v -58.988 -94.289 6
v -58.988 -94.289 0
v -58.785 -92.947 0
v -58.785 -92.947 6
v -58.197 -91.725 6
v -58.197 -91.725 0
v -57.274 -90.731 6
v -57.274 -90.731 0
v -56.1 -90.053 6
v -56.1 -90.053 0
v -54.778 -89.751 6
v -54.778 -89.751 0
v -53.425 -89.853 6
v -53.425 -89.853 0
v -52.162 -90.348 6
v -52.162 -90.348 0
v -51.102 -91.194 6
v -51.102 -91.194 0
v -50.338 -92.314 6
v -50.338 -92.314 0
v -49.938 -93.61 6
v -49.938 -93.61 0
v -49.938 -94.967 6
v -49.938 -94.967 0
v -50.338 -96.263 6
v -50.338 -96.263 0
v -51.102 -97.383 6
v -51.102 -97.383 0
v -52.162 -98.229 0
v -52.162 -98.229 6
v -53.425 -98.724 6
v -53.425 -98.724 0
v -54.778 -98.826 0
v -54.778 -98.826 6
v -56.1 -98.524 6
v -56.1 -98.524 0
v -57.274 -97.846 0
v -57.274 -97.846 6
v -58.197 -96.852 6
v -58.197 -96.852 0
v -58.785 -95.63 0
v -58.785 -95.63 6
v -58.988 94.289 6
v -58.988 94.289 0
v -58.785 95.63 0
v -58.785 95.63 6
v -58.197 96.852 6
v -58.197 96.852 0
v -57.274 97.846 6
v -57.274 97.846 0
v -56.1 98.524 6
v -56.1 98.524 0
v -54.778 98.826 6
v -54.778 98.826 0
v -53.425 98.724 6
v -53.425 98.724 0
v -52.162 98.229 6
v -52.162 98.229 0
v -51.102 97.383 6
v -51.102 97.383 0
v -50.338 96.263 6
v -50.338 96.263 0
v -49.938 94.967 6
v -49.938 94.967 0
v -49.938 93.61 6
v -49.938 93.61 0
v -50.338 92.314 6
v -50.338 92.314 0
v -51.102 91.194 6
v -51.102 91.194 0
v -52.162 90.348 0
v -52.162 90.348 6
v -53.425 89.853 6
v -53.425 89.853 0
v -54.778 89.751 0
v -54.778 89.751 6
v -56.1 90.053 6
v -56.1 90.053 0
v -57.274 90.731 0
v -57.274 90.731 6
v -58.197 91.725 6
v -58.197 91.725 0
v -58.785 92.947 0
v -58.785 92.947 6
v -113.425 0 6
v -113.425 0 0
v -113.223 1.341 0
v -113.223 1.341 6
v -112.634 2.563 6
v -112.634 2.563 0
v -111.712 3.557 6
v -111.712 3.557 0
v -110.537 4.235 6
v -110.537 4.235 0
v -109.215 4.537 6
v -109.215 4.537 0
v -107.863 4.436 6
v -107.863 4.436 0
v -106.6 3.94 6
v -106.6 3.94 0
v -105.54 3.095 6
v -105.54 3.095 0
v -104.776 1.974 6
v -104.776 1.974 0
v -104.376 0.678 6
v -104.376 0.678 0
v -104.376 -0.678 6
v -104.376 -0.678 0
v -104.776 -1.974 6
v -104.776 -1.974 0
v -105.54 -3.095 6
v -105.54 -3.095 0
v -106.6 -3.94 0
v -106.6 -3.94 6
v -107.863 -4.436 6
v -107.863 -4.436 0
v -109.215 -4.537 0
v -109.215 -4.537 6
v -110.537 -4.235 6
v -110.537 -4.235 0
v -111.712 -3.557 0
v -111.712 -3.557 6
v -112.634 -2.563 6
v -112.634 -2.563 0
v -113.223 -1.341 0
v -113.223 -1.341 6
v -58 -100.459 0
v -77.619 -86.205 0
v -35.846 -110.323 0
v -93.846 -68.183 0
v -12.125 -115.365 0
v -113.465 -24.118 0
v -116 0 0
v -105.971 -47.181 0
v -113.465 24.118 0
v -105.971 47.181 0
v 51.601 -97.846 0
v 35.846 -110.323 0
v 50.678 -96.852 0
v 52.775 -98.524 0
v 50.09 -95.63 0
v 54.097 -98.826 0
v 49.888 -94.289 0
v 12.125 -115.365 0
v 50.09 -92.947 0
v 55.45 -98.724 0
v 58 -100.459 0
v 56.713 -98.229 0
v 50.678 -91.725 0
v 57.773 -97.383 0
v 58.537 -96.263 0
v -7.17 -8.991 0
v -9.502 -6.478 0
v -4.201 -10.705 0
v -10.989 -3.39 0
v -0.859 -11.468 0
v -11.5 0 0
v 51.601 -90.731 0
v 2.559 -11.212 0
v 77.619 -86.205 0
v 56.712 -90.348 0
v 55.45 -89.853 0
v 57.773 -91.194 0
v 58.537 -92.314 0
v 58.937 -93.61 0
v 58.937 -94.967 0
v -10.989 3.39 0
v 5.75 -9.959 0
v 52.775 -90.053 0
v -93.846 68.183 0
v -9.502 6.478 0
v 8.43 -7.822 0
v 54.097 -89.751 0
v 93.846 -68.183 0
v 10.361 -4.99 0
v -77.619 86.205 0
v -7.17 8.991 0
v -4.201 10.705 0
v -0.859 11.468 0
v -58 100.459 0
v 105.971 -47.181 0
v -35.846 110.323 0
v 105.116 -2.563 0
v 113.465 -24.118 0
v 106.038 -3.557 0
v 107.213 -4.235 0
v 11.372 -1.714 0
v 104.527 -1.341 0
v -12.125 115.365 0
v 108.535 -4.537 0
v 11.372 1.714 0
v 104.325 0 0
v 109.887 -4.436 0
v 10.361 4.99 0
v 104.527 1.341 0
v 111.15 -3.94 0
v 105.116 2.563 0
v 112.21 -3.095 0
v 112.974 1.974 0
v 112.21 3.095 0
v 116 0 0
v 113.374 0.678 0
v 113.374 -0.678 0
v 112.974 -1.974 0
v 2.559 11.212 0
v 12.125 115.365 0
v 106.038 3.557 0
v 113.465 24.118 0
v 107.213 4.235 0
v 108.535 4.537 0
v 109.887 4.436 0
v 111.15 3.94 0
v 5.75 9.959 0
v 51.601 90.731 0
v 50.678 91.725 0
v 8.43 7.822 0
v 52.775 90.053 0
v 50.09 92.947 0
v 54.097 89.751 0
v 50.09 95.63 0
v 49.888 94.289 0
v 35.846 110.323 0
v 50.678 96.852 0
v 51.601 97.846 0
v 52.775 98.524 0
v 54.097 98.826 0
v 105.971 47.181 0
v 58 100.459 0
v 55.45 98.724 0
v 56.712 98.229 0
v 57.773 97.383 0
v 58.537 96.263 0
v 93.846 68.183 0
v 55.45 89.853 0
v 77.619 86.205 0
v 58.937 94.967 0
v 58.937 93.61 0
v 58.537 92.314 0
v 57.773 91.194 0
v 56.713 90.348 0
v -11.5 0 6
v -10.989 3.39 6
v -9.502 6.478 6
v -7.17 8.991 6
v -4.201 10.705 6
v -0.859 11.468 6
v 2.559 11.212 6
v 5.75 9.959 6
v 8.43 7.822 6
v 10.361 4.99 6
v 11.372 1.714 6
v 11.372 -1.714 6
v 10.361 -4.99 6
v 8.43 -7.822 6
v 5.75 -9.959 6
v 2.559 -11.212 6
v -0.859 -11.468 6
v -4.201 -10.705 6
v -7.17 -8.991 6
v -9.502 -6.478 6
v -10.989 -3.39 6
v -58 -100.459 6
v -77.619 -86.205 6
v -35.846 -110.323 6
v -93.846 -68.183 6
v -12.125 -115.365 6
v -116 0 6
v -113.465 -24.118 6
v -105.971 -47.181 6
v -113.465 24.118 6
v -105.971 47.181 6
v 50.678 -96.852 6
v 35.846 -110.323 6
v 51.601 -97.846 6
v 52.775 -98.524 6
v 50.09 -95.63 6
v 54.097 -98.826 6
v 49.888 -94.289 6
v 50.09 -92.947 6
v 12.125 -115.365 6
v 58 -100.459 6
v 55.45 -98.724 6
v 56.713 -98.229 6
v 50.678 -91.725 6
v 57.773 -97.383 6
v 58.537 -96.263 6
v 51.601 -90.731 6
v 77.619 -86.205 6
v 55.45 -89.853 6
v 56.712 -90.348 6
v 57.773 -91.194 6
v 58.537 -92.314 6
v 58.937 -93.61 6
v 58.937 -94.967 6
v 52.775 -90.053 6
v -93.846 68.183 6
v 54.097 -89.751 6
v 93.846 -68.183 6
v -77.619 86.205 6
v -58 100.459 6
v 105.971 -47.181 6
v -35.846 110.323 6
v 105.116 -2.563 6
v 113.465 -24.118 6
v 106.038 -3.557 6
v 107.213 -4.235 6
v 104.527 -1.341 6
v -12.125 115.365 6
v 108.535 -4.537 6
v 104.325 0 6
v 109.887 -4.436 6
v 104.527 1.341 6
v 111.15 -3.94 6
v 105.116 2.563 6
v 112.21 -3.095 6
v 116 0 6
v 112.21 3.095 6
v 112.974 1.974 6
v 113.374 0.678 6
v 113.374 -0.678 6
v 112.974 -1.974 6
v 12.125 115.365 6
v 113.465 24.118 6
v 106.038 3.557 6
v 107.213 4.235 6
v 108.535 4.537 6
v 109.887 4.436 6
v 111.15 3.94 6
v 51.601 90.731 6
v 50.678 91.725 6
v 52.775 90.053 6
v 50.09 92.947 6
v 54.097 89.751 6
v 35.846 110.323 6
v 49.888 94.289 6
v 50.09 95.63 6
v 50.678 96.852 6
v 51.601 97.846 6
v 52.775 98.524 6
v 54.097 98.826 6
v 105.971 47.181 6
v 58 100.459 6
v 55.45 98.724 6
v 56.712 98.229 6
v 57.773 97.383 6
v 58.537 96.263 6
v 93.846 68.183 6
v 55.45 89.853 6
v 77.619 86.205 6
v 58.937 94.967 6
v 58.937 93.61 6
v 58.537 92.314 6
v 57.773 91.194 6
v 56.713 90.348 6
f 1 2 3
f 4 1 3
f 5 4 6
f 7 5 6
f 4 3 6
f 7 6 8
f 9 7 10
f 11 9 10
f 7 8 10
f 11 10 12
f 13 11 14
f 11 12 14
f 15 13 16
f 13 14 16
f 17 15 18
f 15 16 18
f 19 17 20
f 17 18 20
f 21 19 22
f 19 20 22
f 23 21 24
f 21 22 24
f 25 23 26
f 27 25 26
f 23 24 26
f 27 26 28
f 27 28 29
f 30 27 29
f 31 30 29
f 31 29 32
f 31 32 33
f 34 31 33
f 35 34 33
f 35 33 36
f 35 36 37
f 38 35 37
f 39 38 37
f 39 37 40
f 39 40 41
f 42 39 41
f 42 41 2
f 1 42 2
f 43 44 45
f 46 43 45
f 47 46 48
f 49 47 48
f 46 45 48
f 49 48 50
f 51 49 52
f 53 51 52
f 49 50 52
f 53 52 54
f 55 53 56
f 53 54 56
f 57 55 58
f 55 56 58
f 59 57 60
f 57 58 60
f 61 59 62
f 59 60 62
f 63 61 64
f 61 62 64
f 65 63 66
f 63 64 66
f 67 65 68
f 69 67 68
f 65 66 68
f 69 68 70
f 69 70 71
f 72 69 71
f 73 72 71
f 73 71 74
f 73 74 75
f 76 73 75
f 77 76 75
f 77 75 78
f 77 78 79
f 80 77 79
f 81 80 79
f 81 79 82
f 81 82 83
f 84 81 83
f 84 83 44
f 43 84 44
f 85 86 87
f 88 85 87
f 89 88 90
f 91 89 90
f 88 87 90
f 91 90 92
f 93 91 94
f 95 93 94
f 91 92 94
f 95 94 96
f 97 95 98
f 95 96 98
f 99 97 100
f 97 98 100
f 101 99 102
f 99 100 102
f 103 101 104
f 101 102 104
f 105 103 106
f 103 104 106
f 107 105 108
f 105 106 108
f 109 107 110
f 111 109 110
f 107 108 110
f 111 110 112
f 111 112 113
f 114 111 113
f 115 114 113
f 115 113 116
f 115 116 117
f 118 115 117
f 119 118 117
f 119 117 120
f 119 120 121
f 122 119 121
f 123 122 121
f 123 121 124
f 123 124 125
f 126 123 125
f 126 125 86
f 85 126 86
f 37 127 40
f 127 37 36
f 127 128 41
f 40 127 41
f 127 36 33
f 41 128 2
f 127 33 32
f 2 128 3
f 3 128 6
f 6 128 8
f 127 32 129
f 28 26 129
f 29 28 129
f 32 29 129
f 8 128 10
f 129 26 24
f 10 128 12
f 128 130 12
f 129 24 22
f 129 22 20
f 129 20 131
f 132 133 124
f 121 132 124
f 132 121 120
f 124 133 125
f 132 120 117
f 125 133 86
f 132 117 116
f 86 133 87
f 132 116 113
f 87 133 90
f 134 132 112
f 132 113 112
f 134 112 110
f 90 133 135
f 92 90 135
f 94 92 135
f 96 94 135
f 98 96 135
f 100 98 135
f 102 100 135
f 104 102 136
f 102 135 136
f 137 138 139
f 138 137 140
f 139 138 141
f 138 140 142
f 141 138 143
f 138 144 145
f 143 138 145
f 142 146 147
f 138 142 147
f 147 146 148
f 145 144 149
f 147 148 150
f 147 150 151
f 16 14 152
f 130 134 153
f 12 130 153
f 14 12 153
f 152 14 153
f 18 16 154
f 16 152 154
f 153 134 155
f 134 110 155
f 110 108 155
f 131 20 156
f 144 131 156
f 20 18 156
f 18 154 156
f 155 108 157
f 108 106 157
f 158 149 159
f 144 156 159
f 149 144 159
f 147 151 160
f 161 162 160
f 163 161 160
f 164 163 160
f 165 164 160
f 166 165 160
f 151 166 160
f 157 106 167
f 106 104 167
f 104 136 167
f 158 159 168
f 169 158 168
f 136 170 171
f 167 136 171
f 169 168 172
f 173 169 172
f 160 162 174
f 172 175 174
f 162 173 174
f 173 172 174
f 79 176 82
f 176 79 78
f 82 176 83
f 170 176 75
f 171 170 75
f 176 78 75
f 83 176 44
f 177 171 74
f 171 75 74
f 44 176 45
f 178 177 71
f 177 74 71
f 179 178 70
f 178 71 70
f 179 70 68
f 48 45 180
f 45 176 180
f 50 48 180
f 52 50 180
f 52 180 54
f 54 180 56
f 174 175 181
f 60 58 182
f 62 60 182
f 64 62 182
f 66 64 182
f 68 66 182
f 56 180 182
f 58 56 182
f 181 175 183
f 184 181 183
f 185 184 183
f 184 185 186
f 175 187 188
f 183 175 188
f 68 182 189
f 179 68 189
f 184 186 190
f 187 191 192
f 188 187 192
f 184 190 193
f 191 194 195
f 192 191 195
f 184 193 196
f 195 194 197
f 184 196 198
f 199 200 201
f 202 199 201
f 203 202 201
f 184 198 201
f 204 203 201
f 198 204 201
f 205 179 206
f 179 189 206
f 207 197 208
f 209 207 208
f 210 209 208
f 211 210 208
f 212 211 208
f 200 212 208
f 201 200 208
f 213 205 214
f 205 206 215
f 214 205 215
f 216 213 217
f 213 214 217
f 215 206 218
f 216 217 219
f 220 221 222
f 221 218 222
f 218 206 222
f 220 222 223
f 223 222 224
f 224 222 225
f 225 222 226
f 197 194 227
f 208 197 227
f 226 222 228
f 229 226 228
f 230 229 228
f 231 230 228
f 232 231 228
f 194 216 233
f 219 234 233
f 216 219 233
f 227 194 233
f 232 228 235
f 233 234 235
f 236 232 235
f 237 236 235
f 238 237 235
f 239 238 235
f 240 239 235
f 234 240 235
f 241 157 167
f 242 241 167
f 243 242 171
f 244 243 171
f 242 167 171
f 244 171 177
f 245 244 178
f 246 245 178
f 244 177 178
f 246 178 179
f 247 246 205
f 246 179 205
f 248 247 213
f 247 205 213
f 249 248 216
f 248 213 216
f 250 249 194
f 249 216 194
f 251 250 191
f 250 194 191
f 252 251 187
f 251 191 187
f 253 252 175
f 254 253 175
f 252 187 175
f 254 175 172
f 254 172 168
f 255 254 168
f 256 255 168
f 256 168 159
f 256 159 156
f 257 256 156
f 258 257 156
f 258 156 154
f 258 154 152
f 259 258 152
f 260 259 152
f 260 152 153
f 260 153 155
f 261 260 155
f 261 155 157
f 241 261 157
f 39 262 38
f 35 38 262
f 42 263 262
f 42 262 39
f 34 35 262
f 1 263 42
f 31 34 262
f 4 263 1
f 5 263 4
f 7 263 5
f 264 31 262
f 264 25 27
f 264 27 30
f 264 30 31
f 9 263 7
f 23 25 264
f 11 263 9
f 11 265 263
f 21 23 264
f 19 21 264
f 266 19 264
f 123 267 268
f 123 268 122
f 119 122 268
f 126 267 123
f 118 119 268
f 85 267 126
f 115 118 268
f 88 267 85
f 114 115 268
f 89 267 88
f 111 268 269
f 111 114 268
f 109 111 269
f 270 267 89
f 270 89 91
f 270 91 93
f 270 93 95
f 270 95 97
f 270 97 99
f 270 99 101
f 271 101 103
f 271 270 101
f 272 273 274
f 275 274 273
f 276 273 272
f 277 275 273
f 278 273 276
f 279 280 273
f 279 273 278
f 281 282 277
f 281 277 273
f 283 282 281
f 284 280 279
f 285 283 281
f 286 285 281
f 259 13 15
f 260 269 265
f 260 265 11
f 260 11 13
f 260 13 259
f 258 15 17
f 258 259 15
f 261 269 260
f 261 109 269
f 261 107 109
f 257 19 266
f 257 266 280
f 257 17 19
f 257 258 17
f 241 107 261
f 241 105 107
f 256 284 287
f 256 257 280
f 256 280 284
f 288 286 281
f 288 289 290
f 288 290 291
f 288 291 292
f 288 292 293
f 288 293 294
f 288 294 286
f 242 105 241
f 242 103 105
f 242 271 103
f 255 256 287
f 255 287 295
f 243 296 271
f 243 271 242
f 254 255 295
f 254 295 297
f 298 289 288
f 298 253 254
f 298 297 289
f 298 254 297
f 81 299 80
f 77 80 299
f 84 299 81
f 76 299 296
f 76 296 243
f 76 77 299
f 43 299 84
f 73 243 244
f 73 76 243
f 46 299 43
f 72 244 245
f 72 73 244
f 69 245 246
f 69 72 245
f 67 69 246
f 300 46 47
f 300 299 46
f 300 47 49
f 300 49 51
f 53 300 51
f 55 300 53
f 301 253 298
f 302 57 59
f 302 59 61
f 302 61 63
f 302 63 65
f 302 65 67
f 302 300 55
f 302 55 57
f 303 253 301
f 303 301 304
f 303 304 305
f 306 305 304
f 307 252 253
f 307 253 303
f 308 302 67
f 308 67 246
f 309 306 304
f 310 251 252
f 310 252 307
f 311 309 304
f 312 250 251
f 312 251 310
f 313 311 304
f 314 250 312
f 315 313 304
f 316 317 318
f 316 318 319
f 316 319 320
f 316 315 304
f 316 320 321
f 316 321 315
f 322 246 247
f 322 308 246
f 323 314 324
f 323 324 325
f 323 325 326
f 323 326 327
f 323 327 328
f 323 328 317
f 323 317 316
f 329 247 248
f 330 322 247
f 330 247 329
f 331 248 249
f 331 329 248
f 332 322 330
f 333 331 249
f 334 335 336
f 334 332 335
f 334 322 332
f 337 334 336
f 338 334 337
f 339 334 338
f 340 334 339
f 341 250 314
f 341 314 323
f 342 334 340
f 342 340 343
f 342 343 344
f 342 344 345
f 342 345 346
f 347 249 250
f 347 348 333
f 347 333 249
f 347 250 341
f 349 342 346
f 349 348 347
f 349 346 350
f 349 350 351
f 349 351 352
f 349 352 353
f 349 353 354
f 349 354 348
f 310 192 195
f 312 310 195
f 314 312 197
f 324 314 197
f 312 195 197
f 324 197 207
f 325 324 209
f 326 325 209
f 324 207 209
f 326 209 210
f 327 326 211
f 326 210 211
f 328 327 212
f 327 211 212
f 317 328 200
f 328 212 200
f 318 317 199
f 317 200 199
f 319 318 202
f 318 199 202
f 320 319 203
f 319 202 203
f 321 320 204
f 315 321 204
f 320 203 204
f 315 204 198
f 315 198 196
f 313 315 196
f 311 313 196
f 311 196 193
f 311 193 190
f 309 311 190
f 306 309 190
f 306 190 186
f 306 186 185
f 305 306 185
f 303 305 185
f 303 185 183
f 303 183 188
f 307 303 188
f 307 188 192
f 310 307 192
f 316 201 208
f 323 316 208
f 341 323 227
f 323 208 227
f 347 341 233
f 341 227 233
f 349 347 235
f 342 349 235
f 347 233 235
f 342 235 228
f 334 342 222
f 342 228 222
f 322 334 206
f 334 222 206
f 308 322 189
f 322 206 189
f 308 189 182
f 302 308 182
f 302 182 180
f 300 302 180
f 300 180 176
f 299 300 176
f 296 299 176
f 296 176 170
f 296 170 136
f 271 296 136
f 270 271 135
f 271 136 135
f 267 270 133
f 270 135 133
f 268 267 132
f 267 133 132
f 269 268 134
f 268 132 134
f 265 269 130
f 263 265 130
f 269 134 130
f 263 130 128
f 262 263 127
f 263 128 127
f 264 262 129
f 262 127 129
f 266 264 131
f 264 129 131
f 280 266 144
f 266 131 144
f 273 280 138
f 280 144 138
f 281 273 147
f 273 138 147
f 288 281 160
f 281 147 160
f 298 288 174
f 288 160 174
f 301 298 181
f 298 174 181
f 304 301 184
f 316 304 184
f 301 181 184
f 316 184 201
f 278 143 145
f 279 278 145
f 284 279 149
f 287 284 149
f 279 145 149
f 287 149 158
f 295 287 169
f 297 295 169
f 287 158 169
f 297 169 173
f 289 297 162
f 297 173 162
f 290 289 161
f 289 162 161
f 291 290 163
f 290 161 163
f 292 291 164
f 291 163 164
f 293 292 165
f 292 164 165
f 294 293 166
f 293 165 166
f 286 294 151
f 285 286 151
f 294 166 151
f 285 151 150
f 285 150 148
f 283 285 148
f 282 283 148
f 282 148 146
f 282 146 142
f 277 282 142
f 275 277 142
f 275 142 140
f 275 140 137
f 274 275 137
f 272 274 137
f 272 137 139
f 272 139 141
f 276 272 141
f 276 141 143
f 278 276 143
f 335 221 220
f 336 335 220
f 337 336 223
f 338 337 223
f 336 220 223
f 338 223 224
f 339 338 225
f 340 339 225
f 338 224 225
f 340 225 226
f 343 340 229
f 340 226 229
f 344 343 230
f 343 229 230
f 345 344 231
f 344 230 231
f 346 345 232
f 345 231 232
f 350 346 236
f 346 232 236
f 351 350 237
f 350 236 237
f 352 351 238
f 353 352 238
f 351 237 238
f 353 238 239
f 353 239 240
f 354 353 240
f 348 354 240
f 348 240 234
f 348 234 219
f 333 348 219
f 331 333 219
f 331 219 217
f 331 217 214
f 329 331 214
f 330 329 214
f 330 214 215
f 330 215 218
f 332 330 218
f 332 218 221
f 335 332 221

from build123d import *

# Parameters (mm, degrees)
F0_R     = 116
F1_DEPTH = 6
F3_D     = 9.1
F5_D     = 23


with BuildPart() as f1:
    # F0 (on Top) → F1 (new body)
    with BuildSketch(Plane.XY):
        Circle(F0_R)
    extrude(amount=F1_DEPTH)

    # F3 (through all)
    with Locations(Plane.XY.offset(6)):
        with Locations((-54.4375, 94.288516), (54.4375, 94.288516), (108.875, 0), (54.4375, -94.288516), (-54.4375, -94.288516), (-108.875, 0)):
            Hole(F3_D / 2)

    # F5 (through all)
    with Locations(Plane.XY.offset(6)):
        with Locations((0, 0)):
            Hole(F5_D / 2)


solid = f1.part
